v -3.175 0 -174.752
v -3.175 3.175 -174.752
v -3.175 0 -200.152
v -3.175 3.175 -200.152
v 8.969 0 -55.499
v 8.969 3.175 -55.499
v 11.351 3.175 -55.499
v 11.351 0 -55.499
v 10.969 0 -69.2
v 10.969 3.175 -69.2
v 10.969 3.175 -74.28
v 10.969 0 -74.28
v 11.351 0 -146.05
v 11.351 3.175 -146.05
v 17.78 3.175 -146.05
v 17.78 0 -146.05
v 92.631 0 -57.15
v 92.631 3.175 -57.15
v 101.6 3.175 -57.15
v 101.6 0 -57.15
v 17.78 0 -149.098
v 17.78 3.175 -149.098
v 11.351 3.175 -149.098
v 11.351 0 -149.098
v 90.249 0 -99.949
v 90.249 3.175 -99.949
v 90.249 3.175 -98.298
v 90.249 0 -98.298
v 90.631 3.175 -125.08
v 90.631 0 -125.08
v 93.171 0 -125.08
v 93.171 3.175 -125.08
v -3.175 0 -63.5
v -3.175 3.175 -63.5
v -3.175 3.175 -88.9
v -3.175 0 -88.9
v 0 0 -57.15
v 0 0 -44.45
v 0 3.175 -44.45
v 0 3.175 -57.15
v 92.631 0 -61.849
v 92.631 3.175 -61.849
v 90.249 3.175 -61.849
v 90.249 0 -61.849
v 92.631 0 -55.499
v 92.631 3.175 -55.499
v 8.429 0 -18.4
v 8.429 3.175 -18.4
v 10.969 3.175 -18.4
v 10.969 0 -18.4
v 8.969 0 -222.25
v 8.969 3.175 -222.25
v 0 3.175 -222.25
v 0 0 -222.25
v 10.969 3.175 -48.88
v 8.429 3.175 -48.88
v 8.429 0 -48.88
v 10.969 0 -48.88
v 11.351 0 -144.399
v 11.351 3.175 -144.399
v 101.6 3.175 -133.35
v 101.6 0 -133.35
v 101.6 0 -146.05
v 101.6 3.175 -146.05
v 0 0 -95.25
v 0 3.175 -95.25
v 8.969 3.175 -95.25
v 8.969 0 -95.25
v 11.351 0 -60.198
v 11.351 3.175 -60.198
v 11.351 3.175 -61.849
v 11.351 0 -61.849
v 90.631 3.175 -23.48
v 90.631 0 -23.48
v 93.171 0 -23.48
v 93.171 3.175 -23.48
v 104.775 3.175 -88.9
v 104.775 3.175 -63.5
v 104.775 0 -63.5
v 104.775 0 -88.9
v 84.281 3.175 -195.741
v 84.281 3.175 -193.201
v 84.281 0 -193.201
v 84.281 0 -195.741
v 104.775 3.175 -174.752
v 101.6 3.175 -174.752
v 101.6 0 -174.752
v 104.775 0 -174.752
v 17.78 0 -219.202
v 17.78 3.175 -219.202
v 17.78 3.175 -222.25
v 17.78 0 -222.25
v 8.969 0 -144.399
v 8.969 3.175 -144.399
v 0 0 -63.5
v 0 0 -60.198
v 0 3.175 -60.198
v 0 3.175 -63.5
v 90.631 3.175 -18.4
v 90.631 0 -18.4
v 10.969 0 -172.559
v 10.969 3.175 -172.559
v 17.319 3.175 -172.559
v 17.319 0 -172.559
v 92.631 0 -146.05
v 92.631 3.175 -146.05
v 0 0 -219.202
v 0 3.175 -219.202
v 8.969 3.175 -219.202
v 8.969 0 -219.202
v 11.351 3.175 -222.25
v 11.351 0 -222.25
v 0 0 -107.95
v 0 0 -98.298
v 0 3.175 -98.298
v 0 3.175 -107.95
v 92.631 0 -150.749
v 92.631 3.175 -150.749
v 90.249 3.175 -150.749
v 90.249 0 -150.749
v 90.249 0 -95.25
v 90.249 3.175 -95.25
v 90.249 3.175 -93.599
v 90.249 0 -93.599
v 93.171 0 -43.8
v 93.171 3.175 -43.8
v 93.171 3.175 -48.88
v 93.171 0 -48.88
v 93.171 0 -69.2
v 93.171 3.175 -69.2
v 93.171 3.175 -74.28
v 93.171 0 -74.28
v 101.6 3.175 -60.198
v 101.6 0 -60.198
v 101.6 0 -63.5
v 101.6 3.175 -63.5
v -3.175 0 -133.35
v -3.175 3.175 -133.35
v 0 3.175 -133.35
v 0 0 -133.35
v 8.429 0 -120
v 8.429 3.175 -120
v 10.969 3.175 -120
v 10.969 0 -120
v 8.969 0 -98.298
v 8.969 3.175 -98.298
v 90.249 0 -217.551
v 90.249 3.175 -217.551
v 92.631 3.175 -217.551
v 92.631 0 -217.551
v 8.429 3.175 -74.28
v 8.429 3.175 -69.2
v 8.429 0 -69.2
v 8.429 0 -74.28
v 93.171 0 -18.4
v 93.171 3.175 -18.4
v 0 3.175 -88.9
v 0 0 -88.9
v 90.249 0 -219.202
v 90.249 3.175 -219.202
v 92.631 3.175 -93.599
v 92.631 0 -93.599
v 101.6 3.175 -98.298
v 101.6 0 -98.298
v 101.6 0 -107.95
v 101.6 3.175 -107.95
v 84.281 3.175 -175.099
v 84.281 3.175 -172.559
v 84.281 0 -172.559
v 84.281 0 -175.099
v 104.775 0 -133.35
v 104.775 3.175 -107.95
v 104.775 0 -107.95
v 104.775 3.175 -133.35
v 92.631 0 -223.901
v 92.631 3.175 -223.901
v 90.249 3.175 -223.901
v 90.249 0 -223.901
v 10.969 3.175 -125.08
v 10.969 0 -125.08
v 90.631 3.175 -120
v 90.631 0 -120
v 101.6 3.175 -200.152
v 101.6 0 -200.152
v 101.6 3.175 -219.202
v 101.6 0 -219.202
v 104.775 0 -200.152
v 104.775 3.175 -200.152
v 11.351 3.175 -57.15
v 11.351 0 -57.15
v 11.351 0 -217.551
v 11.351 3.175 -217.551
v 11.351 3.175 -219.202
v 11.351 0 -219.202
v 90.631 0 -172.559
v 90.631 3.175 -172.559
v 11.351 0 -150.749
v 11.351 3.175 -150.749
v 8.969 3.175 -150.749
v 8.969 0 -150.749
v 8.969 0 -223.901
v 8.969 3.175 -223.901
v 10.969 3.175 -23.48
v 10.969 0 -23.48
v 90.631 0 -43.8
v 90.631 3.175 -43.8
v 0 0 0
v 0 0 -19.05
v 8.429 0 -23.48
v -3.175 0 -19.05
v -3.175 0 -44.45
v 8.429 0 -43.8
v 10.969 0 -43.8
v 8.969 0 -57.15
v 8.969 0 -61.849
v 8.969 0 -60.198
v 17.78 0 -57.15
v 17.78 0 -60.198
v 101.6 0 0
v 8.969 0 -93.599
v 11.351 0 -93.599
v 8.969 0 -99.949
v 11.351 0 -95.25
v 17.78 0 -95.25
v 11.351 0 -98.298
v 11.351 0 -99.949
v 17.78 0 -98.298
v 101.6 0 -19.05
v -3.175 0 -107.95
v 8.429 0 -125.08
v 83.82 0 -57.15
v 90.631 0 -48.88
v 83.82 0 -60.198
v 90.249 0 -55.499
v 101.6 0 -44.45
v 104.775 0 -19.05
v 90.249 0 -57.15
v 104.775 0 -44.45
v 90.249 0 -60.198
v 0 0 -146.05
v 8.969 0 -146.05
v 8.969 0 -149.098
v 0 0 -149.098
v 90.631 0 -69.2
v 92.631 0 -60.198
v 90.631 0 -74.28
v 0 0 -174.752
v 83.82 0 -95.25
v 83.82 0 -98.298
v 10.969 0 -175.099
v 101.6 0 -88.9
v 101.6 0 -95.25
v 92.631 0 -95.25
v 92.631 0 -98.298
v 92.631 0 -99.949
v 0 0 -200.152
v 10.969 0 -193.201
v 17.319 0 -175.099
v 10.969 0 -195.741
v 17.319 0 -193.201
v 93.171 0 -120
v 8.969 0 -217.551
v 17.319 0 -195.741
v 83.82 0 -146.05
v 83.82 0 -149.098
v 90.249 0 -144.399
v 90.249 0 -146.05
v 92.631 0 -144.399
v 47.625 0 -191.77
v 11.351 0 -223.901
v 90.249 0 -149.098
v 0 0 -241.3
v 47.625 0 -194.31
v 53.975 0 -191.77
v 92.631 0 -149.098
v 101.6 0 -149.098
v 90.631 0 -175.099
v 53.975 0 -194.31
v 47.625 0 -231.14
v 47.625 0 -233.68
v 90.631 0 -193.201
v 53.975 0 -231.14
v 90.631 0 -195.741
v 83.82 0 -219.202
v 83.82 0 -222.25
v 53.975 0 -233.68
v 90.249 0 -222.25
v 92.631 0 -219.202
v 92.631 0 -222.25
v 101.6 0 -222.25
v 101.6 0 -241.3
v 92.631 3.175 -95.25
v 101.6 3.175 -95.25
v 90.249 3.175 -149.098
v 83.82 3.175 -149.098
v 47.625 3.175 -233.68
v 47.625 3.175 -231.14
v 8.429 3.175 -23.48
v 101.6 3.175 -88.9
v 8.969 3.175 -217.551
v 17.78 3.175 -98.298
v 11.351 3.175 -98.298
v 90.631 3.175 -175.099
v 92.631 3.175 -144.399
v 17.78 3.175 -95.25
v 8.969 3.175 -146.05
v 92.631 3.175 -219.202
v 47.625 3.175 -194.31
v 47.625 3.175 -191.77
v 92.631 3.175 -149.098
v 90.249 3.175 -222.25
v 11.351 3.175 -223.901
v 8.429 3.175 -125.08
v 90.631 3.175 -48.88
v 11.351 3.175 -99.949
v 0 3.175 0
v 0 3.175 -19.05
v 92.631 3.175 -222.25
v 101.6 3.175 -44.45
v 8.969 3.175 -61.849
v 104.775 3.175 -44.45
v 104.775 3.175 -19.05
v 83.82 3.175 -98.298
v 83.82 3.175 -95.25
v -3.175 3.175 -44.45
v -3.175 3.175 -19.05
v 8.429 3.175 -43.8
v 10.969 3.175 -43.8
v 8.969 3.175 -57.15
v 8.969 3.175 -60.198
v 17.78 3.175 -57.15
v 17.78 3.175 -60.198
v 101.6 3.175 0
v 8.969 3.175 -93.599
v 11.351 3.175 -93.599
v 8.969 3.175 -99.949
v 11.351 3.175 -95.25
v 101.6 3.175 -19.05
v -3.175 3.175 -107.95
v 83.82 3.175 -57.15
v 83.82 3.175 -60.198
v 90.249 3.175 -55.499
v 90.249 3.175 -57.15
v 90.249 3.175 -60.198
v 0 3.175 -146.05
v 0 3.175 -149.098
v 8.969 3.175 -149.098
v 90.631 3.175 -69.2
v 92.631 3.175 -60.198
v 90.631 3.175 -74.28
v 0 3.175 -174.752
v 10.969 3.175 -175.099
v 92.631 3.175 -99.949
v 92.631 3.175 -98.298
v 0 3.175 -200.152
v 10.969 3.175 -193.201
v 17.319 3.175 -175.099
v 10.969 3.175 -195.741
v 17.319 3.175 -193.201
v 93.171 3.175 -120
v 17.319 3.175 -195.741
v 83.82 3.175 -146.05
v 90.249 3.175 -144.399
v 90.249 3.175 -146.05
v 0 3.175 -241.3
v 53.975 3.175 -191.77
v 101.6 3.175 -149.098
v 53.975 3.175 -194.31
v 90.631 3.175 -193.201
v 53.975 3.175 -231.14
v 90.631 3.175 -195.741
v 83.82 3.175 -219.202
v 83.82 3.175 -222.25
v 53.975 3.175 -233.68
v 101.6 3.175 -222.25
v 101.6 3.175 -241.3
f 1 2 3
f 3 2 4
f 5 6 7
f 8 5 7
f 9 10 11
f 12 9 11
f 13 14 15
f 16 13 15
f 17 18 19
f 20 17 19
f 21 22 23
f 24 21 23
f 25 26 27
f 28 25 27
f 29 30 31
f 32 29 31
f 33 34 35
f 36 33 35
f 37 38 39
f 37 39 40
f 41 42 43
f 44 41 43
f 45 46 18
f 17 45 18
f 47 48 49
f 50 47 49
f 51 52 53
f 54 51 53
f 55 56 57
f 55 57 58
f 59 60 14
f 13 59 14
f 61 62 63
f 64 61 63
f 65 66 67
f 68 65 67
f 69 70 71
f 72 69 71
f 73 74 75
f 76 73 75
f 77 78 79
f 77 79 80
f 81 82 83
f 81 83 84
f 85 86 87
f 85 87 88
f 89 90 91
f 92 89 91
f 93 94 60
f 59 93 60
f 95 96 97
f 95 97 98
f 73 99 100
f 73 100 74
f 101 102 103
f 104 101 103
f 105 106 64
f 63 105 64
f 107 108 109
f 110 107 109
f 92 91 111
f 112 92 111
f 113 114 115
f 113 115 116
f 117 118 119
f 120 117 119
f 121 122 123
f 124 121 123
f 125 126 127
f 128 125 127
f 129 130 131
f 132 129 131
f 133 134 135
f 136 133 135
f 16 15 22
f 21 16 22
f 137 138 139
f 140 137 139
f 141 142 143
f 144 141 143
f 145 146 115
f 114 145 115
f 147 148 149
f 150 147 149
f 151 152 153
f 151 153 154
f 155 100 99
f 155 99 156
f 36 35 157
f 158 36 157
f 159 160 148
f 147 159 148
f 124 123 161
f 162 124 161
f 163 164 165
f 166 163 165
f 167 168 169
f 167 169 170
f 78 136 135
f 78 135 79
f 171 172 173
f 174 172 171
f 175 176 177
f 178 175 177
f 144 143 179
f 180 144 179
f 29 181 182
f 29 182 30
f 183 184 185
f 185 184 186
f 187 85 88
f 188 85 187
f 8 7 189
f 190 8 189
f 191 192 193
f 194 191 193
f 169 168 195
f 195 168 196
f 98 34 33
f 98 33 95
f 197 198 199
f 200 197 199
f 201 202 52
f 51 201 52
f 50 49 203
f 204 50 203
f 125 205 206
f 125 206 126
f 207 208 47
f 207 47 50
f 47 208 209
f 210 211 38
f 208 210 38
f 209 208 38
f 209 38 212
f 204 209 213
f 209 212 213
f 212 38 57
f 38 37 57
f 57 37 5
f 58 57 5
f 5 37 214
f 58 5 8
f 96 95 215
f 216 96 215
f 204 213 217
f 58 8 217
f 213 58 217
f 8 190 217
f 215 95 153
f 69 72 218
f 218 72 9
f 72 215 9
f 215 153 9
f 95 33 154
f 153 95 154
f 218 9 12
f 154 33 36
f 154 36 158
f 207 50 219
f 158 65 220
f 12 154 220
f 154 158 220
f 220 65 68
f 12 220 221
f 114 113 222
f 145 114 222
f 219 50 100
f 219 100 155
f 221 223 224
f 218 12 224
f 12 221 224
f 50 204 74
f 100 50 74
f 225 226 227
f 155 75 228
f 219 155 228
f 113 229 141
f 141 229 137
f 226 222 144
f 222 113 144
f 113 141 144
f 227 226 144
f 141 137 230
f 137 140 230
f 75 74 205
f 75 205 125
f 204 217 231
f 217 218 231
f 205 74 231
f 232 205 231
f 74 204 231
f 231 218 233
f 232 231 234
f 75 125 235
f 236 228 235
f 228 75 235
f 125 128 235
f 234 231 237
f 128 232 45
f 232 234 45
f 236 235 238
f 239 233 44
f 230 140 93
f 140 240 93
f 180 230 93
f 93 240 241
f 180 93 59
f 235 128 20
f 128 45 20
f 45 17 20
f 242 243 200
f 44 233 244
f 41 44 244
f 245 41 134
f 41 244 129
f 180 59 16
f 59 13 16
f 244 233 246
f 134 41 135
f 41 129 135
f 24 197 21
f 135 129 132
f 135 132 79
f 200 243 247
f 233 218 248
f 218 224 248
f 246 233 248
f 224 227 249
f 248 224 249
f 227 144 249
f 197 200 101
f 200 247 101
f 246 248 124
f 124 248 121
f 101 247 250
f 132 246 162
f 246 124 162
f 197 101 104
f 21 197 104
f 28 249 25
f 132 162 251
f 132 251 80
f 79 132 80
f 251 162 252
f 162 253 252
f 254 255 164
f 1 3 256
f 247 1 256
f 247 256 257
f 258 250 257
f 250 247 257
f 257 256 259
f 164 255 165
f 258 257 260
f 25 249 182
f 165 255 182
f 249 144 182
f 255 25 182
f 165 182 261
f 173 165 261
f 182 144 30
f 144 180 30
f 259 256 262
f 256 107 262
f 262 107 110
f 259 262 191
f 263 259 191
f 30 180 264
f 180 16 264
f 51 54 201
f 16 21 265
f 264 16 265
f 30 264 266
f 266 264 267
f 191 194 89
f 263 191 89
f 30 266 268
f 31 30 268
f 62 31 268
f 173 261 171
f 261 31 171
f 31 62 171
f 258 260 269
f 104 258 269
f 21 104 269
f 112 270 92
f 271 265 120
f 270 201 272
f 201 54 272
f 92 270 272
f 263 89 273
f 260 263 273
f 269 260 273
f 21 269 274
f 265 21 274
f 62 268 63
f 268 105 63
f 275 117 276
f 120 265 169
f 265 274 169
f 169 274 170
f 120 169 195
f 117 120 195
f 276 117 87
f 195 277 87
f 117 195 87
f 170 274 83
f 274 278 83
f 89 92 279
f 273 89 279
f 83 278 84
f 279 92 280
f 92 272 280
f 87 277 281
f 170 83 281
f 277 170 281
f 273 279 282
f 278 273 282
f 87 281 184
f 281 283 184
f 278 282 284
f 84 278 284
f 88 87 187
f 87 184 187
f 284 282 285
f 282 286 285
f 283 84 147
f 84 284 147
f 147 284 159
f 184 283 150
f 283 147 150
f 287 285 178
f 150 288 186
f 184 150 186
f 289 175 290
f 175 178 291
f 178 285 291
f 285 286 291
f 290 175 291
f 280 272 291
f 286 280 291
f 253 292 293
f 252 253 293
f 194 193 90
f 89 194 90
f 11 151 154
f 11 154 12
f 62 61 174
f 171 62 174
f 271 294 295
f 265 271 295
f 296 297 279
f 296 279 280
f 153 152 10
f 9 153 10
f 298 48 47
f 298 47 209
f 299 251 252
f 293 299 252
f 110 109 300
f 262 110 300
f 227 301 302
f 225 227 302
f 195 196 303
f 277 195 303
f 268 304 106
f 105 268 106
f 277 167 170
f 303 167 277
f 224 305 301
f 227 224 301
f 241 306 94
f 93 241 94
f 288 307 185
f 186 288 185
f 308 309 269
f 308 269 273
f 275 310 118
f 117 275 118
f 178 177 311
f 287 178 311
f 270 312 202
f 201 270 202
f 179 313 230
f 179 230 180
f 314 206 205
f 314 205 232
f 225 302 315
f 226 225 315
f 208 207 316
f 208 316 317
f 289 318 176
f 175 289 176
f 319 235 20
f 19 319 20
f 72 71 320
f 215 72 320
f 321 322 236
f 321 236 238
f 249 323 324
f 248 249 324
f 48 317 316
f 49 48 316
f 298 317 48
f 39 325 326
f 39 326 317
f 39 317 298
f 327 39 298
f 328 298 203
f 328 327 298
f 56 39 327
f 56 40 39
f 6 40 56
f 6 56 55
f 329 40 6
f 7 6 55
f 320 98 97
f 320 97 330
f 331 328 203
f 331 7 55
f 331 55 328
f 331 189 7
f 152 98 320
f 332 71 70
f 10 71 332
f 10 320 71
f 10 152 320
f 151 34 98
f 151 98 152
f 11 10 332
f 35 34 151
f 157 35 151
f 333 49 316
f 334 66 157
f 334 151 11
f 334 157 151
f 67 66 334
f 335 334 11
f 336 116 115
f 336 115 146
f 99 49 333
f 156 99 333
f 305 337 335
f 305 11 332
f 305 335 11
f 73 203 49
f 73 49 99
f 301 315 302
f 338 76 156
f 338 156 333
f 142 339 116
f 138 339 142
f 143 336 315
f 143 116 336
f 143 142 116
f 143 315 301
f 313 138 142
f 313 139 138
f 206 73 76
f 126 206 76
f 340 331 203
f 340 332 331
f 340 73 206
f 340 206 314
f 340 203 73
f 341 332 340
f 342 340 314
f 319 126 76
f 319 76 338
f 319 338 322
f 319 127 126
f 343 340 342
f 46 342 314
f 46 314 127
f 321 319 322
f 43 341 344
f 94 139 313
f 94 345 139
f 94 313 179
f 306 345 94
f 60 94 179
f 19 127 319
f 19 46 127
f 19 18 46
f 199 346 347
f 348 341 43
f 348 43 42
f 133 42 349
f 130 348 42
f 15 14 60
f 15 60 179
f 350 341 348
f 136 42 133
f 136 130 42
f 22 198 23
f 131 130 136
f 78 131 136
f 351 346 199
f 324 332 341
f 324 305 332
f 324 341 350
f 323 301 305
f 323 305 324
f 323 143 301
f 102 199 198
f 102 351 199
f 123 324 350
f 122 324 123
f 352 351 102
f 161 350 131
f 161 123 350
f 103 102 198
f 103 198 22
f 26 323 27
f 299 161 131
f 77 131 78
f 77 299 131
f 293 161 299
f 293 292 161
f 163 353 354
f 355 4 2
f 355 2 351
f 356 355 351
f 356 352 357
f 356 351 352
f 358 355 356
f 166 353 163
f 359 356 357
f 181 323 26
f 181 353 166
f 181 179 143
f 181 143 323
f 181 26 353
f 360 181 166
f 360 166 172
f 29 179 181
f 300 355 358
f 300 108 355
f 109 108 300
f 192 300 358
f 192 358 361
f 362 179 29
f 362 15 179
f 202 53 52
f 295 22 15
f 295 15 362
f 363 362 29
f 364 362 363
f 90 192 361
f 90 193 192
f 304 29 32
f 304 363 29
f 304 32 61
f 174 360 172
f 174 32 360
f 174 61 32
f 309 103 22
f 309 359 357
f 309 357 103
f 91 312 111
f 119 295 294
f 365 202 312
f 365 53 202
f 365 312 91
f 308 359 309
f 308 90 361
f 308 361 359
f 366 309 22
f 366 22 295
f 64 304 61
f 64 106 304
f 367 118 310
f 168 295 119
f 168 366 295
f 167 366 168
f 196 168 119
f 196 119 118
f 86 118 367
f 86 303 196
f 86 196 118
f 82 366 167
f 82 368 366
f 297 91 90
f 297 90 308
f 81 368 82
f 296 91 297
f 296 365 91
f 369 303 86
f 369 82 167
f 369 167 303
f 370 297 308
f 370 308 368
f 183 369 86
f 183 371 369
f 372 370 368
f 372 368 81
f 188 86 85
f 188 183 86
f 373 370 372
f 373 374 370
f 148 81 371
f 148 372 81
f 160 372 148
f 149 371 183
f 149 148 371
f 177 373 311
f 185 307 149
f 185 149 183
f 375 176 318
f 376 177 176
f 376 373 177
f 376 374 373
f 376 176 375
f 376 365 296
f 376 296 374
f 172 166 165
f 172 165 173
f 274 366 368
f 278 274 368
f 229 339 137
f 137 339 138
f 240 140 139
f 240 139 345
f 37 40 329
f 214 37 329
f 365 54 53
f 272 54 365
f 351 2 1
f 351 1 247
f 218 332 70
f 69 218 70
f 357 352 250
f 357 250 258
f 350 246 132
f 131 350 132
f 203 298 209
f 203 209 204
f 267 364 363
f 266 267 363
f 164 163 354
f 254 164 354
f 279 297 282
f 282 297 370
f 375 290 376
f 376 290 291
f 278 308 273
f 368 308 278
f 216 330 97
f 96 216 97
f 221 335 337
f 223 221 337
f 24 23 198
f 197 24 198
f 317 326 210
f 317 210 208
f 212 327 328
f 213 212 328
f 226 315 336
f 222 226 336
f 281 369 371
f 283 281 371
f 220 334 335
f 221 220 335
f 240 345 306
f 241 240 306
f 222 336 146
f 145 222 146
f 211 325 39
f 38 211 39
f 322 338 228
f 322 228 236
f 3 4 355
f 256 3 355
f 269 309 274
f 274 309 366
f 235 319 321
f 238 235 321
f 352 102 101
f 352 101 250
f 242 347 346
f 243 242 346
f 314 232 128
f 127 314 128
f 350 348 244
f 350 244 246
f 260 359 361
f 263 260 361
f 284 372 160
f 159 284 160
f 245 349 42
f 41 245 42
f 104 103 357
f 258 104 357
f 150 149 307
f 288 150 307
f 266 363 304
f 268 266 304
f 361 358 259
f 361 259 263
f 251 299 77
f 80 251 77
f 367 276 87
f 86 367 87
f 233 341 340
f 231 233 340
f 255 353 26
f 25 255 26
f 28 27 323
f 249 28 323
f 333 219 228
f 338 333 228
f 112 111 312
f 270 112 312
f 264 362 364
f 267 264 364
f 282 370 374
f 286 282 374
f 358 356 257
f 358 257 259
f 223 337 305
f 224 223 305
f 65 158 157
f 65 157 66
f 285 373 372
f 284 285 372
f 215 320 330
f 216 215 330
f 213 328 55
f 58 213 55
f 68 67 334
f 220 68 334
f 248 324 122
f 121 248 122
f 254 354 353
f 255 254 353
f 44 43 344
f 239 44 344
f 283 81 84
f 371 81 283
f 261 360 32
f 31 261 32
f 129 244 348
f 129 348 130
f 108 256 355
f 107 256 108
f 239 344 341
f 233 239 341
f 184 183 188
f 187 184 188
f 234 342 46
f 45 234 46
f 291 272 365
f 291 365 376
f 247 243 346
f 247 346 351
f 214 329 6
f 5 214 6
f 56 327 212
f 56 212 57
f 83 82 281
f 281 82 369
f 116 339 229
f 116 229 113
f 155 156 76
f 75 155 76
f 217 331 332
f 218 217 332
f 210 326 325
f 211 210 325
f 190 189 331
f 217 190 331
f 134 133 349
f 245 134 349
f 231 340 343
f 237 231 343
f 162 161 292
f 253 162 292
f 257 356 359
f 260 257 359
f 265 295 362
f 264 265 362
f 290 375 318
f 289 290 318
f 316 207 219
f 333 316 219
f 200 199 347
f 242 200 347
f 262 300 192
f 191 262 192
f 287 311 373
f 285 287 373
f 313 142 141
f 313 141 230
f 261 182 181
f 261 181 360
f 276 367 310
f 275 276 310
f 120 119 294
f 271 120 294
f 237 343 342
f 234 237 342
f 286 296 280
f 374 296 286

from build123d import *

# Parameters (mm, degrees)
SKETCH1_W           = 101.6
SKETCH1_H           = 241.3
BOSS_EXTRUDE1_DEPTH = 3.175
SKETCH2_W           = 2.54
SKETCH2_H           = 5.08
SKETCH2_W_2         = 6.35
SKETCH2_H_2         = 2.54
CUT_EXTRUDE1_DEPTH  = 6.35
SKETCH3_W           = 6.35
SKETCH3_H           = 25.4
BOSS_EXTRUDE2_DEPTH = 3.175


with BuildPart() as part:
    # Sketch1 → Boss-Extrude1 (new body)
    with BuildSketch(Plane(origin=(0, 0, 0), x_dir=(1, 0, 0), z_dir=(0, 1, 0))):
        with Locations((50.8, 120.65)):
            Rectangle(SKETCH1_W, SKETCH1_H)
    extrude(amount=BOSS_EXTRUDE1_DEPTH)

    # Sketch2 → Cut-Extrude1 (cut)
    with BuildSketch(Plane(origin=(0, 3.175, 0), x_dir=(1, 0, 0), z_dir=(0, 1, 0))):
        with Locations((9.698538564, 20.940235373)):
            Rectangle(SKETCH2_W, SKETCH2_H)
        with Locations((9.698538564, 46.340235373)):
            Rectangle(SKETCH2_W, SKETCH2_H)
        with Locations((9.698538564, 71.740235373)):
            Rectangle(SKETCH2_W, SKETCH2_H)
        with Locations((9.698538564, 122.540235373)):
            Rectangle(SKETCH2_W, SKETCH2_H)
        with Locations((14.143538564, 173.828614979)):
            Rectangle(SKETCH2_W_2, SKETCH2_H_2)
        with Locations((14.143538564, 194.471385021)):
            Rectangle(SKETCH2_W_2, SKETCH2_H_2)
        with Locations((50.8, 193.04)):
            Rectangle(SKETCH2_W_2, SKETCH2_H_2)
        with Locations((50.8, 232.41)):
            Rectangle(SKETCH2_W_2, SKETCH2_H_2)
        Polygon((8.969375, 60.198), (0, 60.198), (0, 57.15), (8.969375, 57.15), (8.969375, 55.499), (11.350625, 55.499), (11.350625, 57.15), (17.78, 57.15), (17.78, 60.198), (11.350625, 60.198), (11.350625, 61.849), (8.969375, 61.849), align=None)
        Polygon((8.969375, 98.298), (0, 98.298), (0, 95.25), (8.969375, 95.25), (8.969375, 93.599), (11.350625, 93.599), (11.350625, 95.25), (17.78, 95.25), (17.78, 98.298), (11.350625, 98.298), (11.350625, 99.949), (8.969375, 99.949), align=None)
        Polygon((8.969375, 149.098), (0, 149.098), (0, 146.05), (8.969375, 146.05), (8.969375, 144.399), (11.350625, 144.399), (11.350625, 146.05), (17.78, 146.05), (17.78, 149.098), (11.350625, 149.098), (11.350625, 150.749), (8.969375, 150.749), align=None)
        Polygon((8.969375, 222.25), (0, 222.25), (0, 219.202), (8.969375, 219.202), (8.969375, 217.551), (11.350625, 217.551), (11.350625, 219.202), (17.78, 219.202), (17.78, 222.25), (11.350625, 222.25), (11.350625, 223.901), (8.969375, 223.901), align=None)
        with Locations((91.901461436, 20.940235373)):
            Rectangle(SKETCH2_W, SKETCH2_H)
        Polygon((90.249375, 61.849), (90.249375, 60.198), (83.82, 60.198), (83.82, 57.15), (90.249375, 57.15), (90.249375, 55.499), (92.630625, 55.499), (92.630625, 57.15), (101.6, 57.15), (101.6, 60.198), (92.630625, 60.198), (92.630625, 61.849), align=None)
        with Locations((91.901461436, 46.340235373)):
            Rectangle(SKETCH2_W, SKETCH2_H)
        with Locations((91.901461436, 71.740235373)):
            Rectangle(SKETCH2_W, SKETCH2_H)
        Polygon((90.249375, 93.599), (92.630625, 93.599), (92.630625, 95.25), (101.6, 95.25), (101.6, 98.298), (92.630625, 98.298), (92.630625, 99.949), (90.249375, 99.949), (90.249375, 98.298), (83.82, 98.298), (83.82, 95.25), (90.249375, 95.25), align=None)
        with Locations((91.901461436, 122.540235373)):
            Rectangle(SKETCH2_W, SKETCH2_H)
        Polygon((90.249375, 144.399), (92.630625, 144.399), (92.630625, 146.05), (101.6, 146.05), (101.6, 149.098), (92.630625, 149.098), (92.630625, 150.749), (90.249375, 150.749), (90.249375, 149.098), (83.82, 149.098), (83.82, 146.05), (90.249375, 146.05), align=None)
        Polygon((90.249375, 219.202), (90.249375, 217.551), (92.630625, 217.551), (92.630625, 219.202), (101.6, 219.202), (101.6, 222.25), (92.630625, 222.25), (92.630625, 223.901), (90.249375, 223.901), (90.249375, 222.25), (83.82, 222.25), (83.82, 219.202), align=None)
        with Locations((87.456461436, 194.471385021)):
            Rectangle(SKETCH2_W_2, SKETCH2_H_2)
        with Locations((87.456461436, 173.828614979)):
            Rectangle(SKETCH2_W_2, SKETCH2_H_2)
    extrude(amount=-CUT_EXTRUDE1_DEPTH, mode=Mode.SUBTRACT)

    # Sketch3 → Boss-Extrude2 (add)
    with BuildSketch(Plane(origin=(0, 3.175, 0), x_dir=(1, 0, 0), z_dir=(0, 1, 0))):
        with Locations((0, 187.452)):
            Rectangle(SKETCH3_W, SKETCH3_H)
        with Locations((0, 120.65)):
            Rectangle(SKETCH3_W, SKETCH3_H)
        with Locations((0, 76.2)):
            Rectangle(SKETCH3_W, SKETCH3_H)
        with Locations((0, 31.75)):
            Rectangle(SKETCH3_W, SKETCH3_H)
        with Locations((101.6, 31.75)):
            Rectangle(SKETCH3_W, SKETCH3_H)
        with Locations((101.6, 76.2)):
            Rectangle(SKETCH3_W, SKETCH3_H)
        with Locations((101.6, 120.65)):
            Rectangle(SKETCH3_W, SKETCH3_H)
        with Locations((101.6, 187.452)):
            Rectangle(SKETCH3_W, SKETCH3_H)
    extrude(amount=-BOSS_EXTRUDE2_DEPTH)


solid = part.part
